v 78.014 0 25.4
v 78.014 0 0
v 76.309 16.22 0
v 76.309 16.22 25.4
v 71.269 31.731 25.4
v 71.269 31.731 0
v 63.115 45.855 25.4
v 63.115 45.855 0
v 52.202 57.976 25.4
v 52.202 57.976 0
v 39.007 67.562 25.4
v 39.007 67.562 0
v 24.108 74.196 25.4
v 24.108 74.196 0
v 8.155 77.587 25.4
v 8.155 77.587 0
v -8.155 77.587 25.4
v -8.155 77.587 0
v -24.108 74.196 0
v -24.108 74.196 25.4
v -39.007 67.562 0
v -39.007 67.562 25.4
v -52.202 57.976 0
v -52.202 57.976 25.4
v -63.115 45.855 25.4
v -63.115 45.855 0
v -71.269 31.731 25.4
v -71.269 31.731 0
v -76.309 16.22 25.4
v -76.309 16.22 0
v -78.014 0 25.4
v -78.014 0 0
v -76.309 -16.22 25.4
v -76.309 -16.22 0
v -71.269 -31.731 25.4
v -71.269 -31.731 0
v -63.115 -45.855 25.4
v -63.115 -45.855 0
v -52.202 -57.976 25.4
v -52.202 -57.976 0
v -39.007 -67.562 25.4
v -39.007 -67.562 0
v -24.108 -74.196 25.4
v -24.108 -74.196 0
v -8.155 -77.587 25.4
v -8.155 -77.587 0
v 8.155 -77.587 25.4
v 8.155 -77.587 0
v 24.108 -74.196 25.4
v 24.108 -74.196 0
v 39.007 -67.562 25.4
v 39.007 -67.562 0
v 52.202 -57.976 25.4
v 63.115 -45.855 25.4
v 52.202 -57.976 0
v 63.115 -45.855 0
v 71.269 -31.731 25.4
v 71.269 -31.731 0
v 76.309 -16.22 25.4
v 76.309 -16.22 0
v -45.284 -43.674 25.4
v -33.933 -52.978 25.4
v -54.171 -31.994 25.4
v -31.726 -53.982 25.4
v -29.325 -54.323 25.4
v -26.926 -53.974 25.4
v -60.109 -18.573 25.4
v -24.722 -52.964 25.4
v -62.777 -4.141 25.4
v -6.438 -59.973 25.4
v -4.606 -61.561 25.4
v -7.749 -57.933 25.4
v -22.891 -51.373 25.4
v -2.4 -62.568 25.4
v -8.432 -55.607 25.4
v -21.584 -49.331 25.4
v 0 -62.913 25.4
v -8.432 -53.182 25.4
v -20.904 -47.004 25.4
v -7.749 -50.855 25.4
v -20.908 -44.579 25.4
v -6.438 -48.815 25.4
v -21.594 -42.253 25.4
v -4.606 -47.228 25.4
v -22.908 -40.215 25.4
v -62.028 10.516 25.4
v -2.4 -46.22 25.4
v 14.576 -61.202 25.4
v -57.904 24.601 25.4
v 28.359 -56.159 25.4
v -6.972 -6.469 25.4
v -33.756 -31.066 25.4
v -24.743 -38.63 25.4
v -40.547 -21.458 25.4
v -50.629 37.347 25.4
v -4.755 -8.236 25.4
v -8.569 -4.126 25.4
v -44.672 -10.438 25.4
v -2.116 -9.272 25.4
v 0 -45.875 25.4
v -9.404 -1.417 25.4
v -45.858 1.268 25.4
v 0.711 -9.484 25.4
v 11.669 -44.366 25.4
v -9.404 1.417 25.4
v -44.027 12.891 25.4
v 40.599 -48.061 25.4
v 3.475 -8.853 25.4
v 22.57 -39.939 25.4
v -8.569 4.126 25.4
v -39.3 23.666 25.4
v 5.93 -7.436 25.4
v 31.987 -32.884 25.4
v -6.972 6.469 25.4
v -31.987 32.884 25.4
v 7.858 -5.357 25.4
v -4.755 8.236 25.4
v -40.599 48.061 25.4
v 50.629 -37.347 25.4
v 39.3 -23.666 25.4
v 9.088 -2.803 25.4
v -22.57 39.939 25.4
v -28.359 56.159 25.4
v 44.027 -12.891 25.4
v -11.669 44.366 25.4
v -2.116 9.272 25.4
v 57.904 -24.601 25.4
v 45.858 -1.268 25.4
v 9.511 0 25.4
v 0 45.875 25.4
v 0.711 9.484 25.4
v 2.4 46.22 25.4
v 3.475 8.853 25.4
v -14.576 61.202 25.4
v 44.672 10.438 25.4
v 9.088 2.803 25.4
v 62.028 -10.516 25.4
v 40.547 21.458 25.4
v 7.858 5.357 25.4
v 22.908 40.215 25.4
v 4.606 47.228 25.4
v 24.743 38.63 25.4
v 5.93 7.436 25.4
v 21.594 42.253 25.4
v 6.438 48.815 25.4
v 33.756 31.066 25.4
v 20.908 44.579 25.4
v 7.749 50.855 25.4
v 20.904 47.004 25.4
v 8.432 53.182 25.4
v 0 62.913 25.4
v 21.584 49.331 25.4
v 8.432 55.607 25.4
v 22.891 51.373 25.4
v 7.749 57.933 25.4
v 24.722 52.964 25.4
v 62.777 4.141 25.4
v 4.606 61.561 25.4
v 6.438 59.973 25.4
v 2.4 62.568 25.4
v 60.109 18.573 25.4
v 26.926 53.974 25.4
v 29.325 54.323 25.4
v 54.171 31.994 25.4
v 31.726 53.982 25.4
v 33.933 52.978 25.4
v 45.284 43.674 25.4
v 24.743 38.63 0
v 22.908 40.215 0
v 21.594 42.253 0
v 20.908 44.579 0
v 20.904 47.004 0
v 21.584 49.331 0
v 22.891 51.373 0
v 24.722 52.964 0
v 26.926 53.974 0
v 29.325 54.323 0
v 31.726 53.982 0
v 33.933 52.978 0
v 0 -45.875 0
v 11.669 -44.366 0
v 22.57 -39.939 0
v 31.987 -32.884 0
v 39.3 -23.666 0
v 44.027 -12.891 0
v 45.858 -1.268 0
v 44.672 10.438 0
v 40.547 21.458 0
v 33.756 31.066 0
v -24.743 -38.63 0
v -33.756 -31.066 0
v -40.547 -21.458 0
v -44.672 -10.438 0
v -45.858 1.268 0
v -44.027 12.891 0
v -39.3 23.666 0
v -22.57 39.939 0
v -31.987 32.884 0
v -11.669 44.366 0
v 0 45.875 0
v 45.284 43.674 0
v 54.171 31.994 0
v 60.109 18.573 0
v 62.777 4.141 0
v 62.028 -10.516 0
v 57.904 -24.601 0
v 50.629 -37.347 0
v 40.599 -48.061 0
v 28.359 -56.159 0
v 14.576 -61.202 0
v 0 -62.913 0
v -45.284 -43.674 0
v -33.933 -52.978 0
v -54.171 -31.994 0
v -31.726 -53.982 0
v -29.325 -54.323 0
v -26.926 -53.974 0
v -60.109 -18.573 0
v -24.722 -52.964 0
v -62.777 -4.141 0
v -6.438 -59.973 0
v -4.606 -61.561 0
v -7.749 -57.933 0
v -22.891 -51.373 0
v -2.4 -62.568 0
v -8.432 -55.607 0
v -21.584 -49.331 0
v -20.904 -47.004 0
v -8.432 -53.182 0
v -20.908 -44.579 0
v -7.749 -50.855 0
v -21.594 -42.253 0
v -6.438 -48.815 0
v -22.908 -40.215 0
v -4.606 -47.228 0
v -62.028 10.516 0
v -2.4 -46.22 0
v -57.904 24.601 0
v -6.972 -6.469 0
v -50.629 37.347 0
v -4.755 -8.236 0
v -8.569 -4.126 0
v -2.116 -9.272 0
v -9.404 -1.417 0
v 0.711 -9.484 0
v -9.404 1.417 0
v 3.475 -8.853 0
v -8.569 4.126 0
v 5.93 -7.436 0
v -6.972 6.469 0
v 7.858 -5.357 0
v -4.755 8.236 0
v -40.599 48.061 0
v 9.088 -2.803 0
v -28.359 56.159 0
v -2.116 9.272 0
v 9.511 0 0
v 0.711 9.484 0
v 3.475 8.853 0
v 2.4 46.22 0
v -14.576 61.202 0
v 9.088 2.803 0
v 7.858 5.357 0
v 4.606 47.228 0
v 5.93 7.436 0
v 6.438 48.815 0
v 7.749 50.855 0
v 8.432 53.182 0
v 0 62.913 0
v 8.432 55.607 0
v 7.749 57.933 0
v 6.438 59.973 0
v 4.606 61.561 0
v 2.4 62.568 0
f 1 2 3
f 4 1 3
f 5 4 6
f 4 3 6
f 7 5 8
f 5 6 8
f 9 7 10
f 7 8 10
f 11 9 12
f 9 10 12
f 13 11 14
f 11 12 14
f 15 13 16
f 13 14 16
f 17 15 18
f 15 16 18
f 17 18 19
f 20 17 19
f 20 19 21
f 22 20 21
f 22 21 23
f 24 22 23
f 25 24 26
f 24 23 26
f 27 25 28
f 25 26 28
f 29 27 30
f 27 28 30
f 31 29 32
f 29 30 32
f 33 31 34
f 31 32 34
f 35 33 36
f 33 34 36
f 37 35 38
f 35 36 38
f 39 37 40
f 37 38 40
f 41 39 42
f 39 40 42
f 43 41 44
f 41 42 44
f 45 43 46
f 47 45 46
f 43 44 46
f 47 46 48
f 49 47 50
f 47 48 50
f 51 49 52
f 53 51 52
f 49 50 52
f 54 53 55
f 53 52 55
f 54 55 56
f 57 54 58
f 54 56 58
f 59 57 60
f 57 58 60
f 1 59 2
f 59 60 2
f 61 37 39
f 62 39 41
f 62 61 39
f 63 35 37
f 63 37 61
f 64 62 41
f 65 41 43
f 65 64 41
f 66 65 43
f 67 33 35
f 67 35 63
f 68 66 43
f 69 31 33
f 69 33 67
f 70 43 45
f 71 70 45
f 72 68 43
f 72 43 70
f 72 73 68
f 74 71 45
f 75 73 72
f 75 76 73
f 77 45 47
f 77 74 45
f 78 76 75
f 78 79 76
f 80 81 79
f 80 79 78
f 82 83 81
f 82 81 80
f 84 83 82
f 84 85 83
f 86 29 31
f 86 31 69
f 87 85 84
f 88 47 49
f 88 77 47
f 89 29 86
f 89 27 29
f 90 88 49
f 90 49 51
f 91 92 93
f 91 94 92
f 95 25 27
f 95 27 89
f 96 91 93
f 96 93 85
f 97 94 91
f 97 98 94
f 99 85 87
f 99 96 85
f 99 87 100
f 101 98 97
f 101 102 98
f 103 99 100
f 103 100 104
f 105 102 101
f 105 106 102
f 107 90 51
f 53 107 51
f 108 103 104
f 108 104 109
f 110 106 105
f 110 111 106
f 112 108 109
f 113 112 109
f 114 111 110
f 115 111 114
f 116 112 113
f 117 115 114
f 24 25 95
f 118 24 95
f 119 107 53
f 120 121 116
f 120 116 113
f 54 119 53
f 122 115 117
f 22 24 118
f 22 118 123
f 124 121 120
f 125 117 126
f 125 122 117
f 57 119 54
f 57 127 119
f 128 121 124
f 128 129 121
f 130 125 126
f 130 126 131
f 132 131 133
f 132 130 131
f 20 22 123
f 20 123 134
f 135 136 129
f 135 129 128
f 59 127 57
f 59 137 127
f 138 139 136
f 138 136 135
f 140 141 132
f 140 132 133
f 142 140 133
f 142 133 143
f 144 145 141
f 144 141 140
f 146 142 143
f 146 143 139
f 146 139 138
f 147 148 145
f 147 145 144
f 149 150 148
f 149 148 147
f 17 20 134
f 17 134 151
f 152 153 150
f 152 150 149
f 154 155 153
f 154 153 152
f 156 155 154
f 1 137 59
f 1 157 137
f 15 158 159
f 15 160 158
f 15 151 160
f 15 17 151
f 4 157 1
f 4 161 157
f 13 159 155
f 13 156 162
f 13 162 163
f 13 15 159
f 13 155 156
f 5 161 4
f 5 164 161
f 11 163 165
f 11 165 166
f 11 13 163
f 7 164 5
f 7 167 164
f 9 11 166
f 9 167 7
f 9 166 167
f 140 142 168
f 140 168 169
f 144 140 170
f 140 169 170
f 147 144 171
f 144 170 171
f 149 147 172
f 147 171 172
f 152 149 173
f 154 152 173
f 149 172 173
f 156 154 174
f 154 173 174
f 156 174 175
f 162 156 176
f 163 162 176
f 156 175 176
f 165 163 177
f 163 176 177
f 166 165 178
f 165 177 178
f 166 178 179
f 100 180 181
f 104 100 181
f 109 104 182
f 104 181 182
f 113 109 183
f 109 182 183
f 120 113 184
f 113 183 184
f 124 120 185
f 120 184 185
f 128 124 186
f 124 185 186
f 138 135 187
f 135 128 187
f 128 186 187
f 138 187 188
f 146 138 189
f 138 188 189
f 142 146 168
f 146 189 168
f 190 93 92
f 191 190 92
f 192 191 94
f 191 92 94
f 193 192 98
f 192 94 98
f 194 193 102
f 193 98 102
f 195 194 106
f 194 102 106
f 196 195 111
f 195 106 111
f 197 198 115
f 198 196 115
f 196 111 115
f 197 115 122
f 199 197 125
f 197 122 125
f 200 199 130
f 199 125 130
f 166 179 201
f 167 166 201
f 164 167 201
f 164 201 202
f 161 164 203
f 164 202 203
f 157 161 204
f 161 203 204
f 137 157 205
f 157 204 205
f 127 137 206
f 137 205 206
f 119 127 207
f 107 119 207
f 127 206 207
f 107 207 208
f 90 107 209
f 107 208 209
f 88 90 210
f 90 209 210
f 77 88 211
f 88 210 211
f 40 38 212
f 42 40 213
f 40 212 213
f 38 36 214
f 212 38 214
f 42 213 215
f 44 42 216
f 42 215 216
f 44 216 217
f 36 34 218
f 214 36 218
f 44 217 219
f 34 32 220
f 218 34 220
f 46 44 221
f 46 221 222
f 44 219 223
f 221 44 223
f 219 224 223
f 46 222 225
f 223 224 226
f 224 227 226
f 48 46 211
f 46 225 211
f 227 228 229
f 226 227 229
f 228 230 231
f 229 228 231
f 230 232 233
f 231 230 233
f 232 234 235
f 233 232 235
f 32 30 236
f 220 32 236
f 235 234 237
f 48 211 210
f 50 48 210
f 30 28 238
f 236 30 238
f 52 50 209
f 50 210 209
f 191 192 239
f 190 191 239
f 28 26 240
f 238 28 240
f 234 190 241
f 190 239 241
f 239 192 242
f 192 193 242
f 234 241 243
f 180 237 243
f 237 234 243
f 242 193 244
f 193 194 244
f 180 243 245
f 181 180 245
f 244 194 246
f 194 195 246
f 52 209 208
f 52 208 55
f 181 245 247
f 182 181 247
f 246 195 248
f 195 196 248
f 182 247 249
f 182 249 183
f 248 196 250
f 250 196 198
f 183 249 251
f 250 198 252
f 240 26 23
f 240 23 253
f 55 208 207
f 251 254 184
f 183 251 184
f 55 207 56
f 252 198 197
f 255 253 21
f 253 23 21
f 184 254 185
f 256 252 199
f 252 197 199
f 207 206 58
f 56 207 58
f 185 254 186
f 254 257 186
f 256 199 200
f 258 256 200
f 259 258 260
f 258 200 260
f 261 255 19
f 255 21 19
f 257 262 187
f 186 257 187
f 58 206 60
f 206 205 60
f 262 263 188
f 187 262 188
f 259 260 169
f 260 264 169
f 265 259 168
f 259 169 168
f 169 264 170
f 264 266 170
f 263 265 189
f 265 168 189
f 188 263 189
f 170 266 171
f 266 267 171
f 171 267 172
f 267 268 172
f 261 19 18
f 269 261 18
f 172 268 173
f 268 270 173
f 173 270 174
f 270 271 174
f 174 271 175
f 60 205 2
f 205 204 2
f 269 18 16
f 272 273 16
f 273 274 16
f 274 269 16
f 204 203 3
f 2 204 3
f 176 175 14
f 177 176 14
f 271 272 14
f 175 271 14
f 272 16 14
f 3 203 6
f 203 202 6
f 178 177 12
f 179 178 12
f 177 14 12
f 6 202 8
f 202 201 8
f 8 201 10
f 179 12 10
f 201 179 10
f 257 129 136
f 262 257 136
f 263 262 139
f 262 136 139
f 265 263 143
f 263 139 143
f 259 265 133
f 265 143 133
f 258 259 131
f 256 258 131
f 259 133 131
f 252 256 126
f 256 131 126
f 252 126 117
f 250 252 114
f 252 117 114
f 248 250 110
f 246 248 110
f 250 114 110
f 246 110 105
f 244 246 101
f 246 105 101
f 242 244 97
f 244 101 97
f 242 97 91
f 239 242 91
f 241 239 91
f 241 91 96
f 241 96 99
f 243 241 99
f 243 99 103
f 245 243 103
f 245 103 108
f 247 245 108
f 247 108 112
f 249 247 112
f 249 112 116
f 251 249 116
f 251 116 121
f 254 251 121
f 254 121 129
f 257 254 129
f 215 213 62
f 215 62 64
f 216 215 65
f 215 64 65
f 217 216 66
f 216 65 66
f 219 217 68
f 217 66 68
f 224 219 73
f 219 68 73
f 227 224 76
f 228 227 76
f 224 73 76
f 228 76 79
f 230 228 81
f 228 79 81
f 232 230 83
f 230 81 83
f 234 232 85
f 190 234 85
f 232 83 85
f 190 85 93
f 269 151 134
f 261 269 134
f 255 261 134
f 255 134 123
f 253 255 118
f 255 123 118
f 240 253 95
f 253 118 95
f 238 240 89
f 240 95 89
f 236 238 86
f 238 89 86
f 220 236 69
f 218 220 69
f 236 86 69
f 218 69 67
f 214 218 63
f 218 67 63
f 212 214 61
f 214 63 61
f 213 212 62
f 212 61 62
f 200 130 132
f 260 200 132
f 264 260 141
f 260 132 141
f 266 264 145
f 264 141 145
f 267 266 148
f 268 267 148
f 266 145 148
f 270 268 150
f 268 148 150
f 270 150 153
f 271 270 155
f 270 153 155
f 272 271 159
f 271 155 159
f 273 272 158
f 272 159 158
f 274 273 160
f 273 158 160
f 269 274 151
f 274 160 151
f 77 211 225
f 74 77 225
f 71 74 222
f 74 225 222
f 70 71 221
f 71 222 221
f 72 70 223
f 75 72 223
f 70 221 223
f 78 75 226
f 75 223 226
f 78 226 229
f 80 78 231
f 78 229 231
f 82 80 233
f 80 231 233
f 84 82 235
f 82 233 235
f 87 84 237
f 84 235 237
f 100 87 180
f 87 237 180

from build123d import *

# Parameters (mm, degrees)
F0_R     = 78.013982
F1_DEPTH = 25.4
F2_R     = 9.510574
F3_DEPTH = 25.401
F5_DEPTH = 25.401
F7_DEPTH = 25.401


with BuildPart() as f1:
    # F0 (on Top) → F1 (new body)
    with BuildSketch(Plane.XY):
        Circle(F0_R)
    extrude(amount=F1_DEPTH)

    # F2 (on face) → F3 (cut, through all)
    with BuildSketch(Plane.XY.offset(25.4)):
        Circle(F2_R)
    extrude(amount=-F3_DEPTH, mode=Mode.SUBTRACT)

    # F4 (on face) → F5 (cut, through all)
    with BuildSketch(Plane(origin=(0, 0, 0), x_dir=(1, 0, 0), z_dir=(0, 0, -1))):
        with BuildLine():
            ThreePointArc((33.933129, -52.977759), (60.378444, 17.678906), (0, 62.913434))
            ThreePointArc((0, 62.913434), (-8.519115, 54.39432), (0, 45.875205))
            ThreePointArc((0, 45.875205), (44.026741, 12.891101), (24.743352, -38.630312))
            ThreePointArc((24.743352, -38.630312), (22.164517, -50.398924), (33.933129, -52.977759))
        make_face()
    extrude(amount=-F5_DEPTH, mode=Mode.SUBTRACT)

    # F6 (on face) → F7 (cut, through all)
    with BuildSketch(Plane.XY.offset(25.4)):
        with BuildLine():
            ThreePointArc((-24.743352, -38.630312), (-44.026741, 12.891101), (0, 45.875205))
            ThreePointArc((0, 45.875205), (8.519115, 54.39432), (0, 62.913434))
            ThreePointArc((0, 62.913434), (-60.378444, 17.678906), (-33.933129, -52.977759))
            ThreePointArc((-33.933129, -52.977759), (-22.164517, -50.398924), (-24.743352, -38.630312))
        make_face()
    extrude(amount=-F7_DEPTH, mode=Mode.SUBTRACT)


solid = f1.part
